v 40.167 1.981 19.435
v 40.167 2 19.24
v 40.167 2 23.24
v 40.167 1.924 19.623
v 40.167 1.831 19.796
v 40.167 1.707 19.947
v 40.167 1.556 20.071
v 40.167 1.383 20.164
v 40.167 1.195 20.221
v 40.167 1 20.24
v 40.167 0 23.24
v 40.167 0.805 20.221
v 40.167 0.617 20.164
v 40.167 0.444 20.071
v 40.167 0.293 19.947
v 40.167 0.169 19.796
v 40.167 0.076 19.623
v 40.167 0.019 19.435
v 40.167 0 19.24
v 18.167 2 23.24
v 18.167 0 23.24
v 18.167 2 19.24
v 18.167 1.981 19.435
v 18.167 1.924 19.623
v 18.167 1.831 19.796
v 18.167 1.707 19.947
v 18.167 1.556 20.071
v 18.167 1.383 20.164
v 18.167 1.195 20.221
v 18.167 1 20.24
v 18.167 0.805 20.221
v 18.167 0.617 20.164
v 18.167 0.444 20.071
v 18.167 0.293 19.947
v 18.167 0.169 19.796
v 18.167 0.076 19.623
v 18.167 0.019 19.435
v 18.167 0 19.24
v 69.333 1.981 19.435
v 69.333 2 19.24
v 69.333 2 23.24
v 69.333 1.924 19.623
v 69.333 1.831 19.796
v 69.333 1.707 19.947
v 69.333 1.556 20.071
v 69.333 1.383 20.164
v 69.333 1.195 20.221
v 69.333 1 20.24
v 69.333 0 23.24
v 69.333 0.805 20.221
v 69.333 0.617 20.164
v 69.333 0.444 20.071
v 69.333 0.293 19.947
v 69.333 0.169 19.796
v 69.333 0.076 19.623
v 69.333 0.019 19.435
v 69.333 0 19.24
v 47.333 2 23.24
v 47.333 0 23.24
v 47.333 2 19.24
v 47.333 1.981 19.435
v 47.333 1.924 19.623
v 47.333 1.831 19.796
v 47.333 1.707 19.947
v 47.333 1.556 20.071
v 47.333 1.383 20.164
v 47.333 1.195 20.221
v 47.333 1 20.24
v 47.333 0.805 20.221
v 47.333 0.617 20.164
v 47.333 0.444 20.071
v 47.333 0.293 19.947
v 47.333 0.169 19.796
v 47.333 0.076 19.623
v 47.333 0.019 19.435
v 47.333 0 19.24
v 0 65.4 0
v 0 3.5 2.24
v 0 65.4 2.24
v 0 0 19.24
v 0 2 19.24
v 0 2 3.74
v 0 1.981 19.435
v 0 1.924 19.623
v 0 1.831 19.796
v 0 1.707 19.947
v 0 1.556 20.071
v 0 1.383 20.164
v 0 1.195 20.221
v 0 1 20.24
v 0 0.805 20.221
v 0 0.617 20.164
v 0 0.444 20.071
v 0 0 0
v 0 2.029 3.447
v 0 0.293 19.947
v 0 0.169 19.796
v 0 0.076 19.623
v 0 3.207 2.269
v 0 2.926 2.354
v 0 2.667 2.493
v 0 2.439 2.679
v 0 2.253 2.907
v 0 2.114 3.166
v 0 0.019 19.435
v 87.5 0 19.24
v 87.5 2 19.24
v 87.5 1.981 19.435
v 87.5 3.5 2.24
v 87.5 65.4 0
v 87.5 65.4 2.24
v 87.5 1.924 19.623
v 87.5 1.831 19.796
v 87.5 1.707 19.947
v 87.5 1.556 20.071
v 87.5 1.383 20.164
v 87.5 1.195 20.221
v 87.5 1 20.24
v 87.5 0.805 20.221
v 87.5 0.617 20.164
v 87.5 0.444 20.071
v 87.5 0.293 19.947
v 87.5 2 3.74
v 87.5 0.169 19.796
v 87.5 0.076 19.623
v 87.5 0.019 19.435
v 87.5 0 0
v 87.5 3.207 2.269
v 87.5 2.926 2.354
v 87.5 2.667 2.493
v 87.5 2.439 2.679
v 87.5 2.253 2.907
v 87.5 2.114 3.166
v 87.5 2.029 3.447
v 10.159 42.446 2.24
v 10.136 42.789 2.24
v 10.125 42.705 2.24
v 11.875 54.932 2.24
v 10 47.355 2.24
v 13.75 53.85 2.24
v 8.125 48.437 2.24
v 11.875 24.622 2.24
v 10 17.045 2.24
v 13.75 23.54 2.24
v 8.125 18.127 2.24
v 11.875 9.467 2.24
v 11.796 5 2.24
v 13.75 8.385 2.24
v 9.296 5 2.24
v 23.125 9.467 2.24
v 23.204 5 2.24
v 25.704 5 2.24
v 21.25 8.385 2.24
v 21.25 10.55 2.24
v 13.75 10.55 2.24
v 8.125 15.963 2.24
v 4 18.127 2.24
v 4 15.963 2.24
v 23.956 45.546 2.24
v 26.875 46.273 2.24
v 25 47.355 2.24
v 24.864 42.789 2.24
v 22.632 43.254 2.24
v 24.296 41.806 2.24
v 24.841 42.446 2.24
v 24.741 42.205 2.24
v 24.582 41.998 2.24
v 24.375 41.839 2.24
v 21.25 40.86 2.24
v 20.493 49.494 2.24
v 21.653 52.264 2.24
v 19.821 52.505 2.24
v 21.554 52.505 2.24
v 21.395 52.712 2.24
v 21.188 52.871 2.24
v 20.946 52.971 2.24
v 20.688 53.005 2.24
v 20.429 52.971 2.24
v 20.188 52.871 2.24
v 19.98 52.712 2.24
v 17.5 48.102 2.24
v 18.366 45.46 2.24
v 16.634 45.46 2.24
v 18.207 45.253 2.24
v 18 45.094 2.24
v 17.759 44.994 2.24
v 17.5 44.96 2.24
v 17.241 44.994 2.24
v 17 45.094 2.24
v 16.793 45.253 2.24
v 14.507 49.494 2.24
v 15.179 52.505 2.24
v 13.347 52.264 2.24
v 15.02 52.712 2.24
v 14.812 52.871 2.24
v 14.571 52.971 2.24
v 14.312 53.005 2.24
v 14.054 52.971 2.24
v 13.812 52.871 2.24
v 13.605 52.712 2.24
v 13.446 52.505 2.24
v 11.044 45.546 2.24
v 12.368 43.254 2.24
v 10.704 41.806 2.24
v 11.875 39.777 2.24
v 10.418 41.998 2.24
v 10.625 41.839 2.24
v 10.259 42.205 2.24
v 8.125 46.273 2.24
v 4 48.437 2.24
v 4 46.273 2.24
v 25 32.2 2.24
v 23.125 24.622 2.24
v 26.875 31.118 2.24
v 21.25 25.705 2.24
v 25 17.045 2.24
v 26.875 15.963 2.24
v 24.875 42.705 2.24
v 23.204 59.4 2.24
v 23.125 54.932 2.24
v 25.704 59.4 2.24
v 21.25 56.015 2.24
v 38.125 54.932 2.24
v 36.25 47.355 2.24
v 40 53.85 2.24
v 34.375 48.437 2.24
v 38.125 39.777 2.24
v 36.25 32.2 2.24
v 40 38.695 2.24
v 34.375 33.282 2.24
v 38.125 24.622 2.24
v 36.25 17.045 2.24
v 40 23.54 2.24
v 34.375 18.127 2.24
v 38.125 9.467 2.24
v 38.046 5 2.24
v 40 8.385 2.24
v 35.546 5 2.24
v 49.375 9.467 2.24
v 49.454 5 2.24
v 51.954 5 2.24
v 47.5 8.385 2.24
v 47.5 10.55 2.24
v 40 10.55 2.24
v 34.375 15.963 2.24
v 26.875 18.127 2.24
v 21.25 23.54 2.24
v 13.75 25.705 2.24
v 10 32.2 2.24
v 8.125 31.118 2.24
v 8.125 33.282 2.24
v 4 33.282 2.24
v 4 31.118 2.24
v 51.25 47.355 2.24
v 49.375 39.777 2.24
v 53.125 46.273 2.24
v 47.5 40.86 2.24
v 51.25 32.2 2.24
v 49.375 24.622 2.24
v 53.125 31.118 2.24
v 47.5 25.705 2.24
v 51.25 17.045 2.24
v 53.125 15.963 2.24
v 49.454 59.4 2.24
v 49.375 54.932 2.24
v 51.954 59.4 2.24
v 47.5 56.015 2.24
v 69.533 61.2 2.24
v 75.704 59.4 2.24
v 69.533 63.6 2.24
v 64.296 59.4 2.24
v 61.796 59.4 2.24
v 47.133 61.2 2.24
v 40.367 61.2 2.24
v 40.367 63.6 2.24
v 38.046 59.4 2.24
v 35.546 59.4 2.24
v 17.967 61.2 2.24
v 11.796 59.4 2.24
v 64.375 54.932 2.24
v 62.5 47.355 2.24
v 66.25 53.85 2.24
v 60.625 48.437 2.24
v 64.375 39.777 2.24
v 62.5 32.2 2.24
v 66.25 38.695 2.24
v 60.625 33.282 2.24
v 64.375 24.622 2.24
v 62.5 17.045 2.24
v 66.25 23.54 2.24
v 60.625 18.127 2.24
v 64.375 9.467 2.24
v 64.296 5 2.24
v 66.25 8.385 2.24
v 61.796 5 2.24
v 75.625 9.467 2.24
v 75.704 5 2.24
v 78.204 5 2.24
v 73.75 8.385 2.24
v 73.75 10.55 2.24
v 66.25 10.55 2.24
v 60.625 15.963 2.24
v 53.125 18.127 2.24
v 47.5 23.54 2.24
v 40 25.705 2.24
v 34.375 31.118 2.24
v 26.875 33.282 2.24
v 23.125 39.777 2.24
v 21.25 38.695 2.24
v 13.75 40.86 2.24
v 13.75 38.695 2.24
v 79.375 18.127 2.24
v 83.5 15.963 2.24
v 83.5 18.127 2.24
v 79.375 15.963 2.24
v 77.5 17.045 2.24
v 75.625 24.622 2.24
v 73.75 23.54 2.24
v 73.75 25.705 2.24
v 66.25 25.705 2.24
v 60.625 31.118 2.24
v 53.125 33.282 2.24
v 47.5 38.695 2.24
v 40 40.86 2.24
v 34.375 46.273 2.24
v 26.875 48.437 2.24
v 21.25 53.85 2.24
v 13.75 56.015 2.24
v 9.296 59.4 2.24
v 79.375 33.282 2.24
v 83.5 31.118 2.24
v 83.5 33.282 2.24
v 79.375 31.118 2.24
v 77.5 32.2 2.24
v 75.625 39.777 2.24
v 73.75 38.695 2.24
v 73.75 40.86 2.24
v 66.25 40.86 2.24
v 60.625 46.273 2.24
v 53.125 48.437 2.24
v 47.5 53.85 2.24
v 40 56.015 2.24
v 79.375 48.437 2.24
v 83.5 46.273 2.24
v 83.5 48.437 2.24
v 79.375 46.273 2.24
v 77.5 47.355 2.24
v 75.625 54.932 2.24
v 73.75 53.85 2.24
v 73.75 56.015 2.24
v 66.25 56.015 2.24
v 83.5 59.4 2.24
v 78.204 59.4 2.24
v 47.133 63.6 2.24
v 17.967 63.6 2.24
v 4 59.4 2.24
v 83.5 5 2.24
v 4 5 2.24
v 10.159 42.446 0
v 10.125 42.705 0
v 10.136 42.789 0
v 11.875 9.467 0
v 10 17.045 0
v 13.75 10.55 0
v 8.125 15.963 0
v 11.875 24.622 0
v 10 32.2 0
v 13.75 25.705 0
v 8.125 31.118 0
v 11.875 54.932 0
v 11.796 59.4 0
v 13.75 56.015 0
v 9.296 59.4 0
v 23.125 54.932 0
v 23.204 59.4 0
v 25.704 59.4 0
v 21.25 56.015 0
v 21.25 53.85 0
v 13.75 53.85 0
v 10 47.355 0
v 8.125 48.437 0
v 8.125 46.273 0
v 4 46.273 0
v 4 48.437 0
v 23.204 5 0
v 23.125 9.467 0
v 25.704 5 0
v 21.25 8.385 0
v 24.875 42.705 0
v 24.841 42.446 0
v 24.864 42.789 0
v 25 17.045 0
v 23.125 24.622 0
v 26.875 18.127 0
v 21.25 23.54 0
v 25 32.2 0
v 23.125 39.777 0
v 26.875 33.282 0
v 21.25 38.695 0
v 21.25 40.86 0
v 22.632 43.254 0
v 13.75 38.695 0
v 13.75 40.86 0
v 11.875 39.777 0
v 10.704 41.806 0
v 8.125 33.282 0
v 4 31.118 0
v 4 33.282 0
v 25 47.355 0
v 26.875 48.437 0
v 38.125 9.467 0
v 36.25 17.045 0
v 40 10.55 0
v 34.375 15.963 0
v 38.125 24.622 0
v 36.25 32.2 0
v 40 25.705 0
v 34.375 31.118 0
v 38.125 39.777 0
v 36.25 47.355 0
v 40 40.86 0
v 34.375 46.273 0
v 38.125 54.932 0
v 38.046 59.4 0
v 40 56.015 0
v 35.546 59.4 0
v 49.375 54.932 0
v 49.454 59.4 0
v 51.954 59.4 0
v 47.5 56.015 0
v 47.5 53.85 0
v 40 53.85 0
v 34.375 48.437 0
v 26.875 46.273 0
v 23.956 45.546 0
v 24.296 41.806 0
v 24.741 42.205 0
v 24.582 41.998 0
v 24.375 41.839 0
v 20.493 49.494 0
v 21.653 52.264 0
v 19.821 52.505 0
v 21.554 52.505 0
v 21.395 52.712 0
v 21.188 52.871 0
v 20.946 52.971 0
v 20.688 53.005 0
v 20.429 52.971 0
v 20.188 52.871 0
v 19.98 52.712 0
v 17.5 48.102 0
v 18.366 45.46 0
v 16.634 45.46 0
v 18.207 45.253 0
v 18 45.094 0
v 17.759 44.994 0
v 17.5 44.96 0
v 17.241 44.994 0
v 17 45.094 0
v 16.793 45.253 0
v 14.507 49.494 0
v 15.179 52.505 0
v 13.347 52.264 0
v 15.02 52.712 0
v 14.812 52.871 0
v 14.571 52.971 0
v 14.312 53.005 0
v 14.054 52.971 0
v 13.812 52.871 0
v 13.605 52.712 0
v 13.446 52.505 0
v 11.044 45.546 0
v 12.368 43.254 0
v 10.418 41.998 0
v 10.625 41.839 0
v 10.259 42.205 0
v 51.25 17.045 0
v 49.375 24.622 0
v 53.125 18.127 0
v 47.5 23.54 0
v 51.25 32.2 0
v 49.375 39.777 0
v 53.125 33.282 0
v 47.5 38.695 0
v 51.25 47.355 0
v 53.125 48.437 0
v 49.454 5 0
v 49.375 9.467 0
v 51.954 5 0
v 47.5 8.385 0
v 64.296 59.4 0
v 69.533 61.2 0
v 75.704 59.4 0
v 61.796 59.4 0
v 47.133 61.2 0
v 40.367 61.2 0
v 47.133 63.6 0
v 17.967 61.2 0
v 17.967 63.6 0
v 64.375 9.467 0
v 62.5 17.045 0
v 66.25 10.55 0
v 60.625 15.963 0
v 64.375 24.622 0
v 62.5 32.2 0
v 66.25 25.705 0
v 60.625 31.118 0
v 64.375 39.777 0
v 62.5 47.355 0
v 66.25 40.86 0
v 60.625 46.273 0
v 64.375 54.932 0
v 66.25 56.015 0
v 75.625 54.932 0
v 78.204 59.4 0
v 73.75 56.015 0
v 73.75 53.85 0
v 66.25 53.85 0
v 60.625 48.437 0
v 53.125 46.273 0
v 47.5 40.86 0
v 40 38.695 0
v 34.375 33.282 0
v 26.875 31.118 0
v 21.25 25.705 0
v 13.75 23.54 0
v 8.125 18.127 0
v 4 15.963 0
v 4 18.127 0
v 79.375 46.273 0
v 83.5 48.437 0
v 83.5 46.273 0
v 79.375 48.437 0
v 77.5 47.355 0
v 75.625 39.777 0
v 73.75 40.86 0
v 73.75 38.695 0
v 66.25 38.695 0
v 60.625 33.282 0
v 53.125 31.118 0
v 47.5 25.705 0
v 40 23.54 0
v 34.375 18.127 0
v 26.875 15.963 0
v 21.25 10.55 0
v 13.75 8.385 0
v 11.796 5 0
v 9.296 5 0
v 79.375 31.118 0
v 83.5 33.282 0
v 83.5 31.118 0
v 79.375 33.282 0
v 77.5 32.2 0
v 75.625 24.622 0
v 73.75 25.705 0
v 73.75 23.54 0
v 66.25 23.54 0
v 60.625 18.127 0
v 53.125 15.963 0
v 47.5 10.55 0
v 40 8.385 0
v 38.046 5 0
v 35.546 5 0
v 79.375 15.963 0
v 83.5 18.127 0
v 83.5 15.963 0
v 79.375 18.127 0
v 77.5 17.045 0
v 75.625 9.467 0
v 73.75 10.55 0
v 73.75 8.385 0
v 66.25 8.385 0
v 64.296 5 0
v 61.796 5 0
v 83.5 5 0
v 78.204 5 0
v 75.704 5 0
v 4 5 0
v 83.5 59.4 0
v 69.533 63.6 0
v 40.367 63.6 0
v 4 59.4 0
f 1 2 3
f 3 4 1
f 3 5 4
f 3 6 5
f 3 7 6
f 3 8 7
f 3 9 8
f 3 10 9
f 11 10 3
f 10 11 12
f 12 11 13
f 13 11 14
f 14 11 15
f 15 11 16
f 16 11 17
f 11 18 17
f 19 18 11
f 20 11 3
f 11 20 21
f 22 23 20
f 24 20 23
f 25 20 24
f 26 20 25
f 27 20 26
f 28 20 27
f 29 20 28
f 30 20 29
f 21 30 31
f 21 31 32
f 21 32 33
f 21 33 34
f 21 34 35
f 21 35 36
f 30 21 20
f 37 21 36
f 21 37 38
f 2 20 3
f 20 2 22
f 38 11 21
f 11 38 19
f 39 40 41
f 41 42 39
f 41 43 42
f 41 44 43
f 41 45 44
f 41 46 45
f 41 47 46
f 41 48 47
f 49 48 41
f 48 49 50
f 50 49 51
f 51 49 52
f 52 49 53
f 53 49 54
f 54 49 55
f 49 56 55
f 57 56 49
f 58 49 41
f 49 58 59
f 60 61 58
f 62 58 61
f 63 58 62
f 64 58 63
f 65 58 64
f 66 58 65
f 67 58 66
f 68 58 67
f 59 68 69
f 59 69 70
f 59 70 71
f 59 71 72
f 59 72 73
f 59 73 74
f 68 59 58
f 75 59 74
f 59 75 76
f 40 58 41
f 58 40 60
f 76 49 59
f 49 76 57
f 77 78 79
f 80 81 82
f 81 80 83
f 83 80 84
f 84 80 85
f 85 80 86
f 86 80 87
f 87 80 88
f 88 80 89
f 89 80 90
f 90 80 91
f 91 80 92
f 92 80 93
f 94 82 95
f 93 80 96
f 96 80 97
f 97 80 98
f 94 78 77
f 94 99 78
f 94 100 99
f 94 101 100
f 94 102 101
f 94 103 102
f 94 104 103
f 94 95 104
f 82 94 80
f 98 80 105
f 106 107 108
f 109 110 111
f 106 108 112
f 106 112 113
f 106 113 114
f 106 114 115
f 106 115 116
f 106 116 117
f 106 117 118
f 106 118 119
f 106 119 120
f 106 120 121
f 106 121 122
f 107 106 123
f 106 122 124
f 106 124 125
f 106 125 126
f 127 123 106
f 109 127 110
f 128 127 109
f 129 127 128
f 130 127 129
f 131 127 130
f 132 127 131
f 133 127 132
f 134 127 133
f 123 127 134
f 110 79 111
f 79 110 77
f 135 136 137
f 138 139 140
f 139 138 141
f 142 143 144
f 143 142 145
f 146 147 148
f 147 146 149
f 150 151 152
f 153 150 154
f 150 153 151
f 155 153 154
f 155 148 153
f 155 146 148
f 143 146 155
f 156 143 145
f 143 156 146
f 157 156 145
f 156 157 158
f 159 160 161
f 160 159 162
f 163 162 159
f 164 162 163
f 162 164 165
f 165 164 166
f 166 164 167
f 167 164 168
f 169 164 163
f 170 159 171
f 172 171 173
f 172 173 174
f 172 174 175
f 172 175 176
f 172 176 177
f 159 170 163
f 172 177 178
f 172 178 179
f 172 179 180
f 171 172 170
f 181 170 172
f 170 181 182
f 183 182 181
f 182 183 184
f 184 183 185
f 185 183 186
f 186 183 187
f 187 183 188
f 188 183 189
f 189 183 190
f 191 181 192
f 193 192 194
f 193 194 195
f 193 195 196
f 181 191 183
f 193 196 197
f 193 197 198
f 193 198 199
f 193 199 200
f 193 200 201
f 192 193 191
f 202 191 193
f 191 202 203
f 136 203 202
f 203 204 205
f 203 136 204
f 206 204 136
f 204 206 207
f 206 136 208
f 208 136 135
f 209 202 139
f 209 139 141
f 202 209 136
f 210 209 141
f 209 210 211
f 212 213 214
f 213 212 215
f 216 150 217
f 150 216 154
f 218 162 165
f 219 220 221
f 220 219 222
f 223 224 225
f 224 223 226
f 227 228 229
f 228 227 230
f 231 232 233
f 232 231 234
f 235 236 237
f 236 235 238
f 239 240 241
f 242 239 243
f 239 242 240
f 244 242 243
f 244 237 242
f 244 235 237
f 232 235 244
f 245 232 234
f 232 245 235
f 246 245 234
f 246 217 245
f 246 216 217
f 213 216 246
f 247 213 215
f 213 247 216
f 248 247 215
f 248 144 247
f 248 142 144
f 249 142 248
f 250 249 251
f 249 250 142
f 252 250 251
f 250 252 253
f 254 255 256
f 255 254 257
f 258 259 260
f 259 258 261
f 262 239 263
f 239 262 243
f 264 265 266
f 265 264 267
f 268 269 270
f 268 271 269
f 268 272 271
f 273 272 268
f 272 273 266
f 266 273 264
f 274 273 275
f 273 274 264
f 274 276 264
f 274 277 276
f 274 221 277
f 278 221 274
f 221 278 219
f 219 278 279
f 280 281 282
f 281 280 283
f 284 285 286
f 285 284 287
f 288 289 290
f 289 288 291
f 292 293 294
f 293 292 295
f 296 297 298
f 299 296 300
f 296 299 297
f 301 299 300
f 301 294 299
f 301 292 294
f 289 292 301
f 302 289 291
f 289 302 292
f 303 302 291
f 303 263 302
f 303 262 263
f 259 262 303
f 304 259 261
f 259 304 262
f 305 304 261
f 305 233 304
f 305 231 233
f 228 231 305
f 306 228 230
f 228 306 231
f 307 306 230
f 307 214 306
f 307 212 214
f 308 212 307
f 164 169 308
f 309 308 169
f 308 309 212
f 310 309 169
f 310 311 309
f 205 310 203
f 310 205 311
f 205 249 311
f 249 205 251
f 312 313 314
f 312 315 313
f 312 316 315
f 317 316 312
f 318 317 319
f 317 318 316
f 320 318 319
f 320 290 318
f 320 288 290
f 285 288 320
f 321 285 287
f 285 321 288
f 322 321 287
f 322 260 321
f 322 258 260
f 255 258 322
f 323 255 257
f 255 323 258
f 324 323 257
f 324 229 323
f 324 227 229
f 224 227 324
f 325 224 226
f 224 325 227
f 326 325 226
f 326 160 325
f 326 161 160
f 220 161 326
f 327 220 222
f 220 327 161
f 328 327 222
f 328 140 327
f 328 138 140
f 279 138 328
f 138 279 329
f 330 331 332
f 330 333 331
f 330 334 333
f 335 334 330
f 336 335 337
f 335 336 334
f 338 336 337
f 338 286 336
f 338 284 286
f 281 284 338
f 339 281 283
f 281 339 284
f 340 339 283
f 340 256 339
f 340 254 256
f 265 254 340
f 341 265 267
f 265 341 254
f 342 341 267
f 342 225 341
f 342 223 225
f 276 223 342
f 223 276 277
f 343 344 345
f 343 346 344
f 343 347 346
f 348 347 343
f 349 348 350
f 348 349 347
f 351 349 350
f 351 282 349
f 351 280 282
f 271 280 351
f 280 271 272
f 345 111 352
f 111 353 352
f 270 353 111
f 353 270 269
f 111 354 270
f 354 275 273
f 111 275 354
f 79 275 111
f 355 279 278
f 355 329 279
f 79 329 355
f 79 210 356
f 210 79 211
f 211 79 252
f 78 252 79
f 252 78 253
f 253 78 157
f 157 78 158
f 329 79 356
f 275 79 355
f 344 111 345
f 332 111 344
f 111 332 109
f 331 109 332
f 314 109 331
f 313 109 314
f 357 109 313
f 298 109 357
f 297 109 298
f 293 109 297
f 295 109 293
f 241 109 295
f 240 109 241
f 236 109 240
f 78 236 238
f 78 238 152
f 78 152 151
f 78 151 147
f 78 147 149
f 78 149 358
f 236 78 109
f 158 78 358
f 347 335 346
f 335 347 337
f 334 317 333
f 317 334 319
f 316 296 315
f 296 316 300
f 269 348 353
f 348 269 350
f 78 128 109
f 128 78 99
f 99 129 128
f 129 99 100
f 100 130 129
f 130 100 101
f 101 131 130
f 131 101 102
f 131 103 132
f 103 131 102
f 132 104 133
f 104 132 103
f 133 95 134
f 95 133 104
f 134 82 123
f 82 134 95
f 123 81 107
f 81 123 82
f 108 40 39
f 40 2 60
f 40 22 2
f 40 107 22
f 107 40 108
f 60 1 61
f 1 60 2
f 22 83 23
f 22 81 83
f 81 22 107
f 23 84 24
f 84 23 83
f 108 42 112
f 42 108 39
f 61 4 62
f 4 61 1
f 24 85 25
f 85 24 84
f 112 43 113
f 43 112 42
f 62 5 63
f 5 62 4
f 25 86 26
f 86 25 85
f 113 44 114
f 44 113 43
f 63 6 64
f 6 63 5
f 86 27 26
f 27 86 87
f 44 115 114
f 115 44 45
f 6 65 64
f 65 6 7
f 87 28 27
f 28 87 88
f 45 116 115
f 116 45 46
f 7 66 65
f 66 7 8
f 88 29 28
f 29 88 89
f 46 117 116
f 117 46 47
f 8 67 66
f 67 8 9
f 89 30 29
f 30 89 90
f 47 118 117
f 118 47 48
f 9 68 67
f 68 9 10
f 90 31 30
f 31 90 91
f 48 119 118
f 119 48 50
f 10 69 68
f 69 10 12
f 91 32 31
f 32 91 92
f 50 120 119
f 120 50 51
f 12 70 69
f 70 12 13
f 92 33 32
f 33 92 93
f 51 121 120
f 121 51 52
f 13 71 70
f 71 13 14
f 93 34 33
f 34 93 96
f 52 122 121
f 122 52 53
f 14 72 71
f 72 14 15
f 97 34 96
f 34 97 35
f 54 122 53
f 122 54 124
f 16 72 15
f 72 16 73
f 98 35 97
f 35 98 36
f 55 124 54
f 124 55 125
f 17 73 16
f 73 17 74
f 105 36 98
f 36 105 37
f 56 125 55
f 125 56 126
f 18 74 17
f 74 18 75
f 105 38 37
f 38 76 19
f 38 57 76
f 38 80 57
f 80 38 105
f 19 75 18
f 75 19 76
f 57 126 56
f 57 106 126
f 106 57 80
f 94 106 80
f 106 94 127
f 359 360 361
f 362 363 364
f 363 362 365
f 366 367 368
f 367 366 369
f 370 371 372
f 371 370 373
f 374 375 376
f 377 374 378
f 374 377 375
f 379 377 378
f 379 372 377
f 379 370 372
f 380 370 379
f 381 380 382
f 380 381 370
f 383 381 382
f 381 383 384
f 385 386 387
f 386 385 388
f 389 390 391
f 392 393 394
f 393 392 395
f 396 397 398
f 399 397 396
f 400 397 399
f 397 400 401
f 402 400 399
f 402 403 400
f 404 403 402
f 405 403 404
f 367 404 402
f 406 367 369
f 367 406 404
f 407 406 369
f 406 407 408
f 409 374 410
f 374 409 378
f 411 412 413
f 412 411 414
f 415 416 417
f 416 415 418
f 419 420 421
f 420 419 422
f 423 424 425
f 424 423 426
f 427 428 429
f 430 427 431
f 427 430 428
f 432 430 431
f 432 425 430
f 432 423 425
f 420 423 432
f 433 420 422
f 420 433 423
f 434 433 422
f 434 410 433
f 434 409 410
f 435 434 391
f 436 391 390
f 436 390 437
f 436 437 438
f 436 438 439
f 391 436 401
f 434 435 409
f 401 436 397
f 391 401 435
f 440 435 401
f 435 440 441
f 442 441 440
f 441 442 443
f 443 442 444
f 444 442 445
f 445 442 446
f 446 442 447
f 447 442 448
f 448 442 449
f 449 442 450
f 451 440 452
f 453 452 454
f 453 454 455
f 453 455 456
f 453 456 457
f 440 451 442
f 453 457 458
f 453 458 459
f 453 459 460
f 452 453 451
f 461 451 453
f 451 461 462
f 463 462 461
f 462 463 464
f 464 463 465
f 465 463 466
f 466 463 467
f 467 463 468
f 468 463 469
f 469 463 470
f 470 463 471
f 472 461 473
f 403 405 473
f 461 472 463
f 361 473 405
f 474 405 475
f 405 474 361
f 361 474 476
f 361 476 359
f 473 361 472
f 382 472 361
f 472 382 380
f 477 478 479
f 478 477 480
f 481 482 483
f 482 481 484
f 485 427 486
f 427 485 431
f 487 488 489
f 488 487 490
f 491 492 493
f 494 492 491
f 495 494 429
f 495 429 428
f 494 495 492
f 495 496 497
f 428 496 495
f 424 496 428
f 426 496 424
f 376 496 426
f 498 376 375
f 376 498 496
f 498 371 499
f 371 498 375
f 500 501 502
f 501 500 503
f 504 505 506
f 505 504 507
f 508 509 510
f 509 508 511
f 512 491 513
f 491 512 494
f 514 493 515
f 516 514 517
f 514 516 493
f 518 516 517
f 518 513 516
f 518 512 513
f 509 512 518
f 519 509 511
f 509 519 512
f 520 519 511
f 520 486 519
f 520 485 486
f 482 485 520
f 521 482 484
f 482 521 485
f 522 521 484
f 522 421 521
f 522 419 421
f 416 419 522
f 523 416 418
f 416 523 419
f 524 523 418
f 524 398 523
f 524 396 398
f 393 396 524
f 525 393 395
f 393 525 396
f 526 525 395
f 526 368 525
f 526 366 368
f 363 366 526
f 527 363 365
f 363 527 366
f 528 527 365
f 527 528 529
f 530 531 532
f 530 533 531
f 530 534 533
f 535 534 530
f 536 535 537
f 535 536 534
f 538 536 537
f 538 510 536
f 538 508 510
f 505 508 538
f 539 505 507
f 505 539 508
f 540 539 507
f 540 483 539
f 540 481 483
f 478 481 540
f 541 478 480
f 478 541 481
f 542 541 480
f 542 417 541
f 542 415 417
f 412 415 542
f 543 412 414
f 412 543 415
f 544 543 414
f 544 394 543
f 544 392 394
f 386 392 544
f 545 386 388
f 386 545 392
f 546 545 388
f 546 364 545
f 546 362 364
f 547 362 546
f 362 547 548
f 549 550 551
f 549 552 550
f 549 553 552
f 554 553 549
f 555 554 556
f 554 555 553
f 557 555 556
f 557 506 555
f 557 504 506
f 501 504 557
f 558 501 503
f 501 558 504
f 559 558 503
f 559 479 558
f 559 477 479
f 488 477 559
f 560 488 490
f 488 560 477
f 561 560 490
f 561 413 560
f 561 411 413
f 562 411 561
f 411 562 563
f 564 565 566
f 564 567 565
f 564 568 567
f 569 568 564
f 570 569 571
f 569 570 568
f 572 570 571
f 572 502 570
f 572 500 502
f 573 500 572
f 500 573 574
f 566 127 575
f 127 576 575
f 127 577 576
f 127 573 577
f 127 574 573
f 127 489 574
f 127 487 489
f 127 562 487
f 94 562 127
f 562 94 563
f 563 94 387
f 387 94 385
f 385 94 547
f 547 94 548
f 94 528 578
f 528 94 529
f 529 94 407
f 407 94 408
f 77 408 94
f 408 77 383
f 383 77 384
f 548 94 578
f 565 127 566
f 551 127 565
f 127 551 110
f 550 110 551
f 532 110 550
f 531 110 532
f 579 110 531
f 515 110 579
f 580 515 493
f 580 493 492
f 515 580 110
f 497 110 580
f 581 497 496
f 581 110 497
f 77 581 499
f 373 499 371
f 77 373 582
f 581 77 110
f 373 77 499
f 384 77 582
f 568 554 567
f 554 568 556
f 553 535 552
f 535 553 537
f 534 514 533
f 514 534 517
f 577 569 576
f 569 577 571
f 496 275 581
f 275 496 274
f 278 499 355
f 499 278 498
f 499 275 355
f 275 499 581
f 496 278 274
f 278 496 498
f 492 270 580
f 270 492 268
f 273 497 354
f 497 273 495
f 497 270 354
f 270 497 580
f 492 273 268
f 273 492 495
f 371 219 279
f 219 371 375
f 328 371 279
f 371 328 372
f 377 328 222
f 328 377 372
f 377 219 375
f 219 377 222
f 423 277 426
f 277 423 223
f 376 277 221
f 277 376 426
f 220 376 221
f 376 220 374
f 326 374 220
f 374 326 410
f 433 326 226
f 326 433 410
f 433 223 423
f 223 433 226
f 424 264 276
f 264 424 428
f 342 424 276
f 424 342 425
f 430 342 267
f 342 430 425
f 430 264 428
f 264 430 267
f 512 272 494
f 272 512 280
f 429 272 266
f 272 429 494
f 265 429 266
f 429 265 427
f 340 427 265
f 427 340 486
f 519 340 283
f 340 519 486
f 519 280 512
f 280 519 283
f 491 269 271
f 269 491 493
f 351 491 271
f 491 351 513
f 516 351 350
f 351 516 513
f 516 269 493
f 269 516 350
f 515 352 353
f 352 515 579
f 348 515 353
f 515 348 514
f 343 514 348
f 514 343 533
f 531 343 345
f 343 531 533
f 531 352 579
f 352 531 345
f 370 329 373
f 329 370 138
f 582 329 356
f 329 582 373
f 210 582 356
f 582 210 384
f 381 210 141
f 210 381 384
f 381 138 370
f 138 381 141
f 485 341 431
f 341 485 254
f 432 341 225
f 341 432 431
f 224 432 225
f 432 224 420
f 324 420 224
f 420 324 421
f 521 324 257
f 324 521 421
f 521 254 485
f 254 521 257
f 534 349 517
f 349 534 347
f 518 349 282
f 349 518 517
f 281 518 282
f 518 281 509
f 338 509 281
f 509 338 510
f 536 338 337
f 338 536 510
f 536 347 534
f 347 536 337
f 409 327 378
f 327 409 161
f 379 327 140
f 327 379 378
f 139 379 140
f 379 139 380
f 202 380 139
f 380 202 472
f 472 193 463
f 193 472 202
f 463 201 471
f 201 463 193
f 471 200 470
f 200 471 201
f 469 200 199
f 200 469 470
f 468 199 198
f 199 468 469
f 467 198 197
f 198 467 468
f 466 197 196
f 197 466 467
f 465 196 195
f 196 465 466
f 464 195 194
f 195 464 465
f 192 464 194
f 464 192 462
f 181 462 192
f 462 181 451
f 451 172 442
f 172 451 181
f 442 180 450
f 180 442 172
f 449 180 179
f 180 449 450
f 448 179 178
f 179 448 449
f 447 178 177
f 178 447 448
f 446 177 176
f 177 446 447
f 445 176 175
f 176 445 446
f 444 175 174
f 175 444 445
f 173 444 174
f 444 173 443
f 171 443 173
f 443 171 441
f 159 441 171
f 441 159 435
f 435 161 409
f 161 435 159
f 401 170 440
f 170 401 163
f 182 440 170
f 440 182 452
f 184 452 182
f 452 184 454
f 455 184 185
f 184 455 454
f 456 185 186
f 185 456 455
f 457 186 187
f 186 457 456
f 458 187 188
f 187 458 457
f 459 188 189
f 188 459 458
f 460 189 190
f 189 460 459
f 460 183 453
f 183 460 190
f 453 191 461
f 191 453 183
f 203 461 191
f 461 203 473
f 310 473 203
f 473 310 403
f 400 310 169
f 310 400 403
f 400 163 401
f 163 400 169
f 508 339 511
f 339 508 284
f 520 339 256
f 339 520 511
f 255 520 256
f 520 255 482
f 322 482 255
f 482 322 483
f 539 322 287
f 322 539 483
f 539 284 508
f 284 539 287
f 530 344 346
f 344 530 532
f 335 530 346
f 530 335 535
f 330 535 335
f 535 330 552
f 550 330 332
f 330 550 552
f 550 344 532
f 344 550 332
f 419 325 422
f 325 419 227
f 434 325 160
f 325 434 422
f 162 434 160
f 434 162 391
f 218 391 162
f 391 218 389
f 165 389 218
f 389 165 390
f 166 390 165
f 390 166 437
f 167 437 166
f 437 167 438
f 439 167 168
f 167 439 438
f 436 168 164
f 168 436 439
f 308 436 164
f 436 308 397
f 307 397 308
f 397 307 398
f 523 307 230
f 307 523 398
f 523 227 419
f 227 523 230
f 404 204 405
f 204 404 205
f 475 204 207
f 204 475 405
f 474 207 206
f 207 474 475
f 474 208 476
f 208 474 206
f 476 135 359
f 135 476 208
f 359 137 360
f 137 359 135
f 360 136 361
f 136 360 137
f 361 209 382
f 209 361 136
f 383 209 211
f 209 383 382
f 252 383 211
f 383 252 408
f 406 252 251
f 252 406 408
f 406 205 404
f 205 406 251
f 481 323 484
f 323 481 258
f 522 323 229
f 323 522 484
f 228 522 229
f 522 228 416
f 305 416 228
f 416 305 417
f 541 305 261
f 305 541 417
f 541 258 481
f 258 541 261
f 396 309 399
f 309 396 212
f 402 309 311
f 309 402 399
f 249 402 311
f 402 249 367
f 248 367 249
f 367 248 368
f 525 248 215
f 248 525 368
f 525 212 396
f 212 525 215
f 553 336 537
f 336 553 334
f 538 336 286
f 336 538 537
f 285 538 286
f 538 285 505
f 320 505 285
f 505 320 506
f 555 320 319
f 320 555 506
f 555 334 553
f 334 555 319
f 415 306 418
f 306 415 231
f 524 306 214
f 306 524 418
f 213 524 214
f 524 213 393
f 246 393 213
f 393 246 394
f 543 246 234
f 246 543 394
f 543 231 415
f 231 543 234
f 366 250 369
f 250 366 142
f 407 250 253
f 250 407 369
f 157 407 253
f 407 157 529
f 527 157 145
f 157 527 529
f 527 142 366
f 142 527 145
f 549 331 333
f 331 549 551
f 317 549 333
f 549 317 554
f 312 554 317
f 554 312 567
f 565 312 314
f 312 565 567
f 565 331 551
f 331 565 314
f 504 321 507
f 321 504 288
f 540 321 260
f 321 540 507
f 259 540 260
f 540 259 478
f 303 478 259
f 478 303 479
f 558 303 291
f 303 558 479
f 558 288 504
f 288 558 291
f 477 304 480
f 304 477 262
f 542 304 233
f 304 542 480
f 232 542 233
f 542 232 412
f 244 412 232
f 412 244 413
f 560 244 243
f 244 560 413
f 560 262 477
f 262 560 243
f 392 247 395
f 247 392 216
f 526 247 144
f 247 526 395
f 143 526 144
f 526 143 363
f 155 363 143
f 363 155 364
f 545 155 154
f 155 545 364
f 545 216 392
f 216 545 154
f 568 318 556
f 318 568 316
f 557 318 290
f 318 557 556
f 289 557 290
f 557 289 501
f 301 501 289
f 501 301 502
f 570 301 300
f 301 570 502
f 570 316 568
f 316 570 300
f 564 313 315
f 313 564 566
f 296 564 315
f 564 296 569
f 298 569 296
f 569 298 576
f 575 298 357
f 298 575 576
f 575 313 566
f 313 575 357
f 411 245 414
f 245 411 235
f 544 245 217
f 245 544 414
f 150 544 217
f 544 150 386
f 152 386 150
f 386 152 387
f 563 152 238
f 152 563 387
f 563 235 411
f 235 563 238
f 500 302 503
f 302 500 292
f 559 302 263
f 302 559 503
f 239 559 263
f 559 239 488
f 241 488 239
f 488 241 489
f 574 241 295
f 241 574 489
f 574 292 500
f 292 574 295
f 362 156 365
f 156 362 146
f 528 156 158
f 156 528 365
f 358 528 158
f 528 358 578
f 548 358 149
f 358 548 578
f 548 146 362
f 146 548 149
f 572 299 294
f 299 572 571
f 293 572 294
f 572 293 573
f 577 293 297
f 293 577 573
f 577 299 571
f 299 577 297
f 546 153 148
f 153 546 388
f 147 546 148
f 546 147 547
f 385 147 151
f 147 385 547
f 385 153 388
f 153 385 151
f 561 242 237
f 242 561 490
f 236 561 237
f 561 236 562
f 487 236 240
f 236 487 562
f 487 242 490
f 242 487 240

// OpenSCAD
// Wake flat v2: built on the v6 design. One-piece L riser printed flat, plate on the bed, lip standing up.
// Kept exactly from v6: plate size (65.4 mm deep x width), 2.24 mm plate (2 + 0.24 extra back layers),
//   hex size/gap/borders/grid positions, the small W, and the lip size (2 mm thick, 20 mm deep from the front face).
// New: wall tabs on the lip top that rest by gravity in slots near the free edge of the next plate.
// No ridges, channels or bands.
//
// Axes: x = width, y = plate depth (y=0 is the lip end of the plate, v6's z_bot end), z = up (plate front face up).
// The x axis is mirrored relative to v6's panel coordinates so the part is the same physical part, not a mirror image.

half_length = true;                       // prototype: half of 175 mm
width       = half_length ? 87.5 : 175;

// v6 plate: back_height 70.5 - panel_top_trim 1.0 - boss_h 4.1
panel_h  = 65.4;
wall     = 2;                             // lip thickness (v6 `wall`)
back_extra = 0.24;                        // v6: 2 * 0.12 extra layers on the back
plate_t  = wall + back_extra;
bottom_lip_depth = 20;                    // v6 lip depth, measured from the back face's y datum
lip_h    = bottom_lip_depth + back_extra; // lip height from the bed: sticks out 18 mm past the front face, same as v6
fillet_in = 1.5;                          // where the lip meets the plate

// hex grid, same as v6
hex_size   = 15;
hex_gap    = 2.5;
border_x   = 4;
border_top = 6;
band_h     = 5;                           // v6 band_v 2 + ramp_h 3: hex area starts this far from the lip end

// small W, same as v6: one hex at the far corner, max x and max v6-z
small_w_on     = true;
small_w_w      = 0.85;
small_w_h      = 0.62;
small_w_stroke = 2.0;
letter_flip    = true;

// tabs on the lip top, slots in the plate
tab_count   = half_length ? 2 : 3;
tab_len     = 22;
tab_h       = 3;                          // tabs stick up past lip_h
tab_clear   = 0.2;                        // slot clearance per side
slot_from_edge = 3;                       // free edge to slot centre line (hex area ends border_top = 6 from the edge)
tab_xs = [for (i = [0 : tab_count - 1]) width * (i + 1) / (tab_count + 1)];

$fn = 32;

function cells(w, h) =
    let (pitch = hex_size + hex_gap, step_x = pitch * 0.75, step_z = pitch * 0.866,
         cx = w / 2, cz = h / 2,
         ncols = ceil(w / (2 * step_x)) + 2, nrows = ceil(h / (2 * step_z)) + 2)
    [for (col = [-ncols : ncols]) for (row = [-nrows : nrows])
        let (parity = ((col % 2) + 2) % 2,
             x = cx + col * step_x,
             z = cz + row * step_z + (parity == 0 ? 0 : step_z / 2))
        [x, z]];

function corner_cell(w, h) =
    let (c = [for (p = cells(w, h)) if (p[0] - hex_size / 2 >= 0 && p[0] + hex_size / 2 <= w && p[1] - hex_size / 2 >= 0 && p[1] + hex_size / 2 <= h) p],
         best = max([for (p = c) p[0] + p[1]]))
    [for (p = c) if (p[0] + p[1] == best) p][0];

module w_shape2d(lw, lh, stroke) {
    f = letter_flip ? -1 : 1;
    pts = [[-lw / 2, f * lh / 2], [-lw / 4, -f * lh / 2], [0, f * lh * 0.15], [lw / 4, -f * lh / 2], [lw / 2, f * lh / 2]];
    for (i = [0 : 3]) hull() {
        translate(pts[i]) circle(d = stroke, $fn = 24);
        translate(pts[i + 1]) circle(d = stroke, $fn = 24);
    }
}

// the v6 hex pattern as a 2D cut; the cell grid is symmetric in x, only the W cell is mirrored
module hex_cut2d(w, h) {
    cc = corner_cell(w, h);
    difference() {
        intersection() {
            for (c = cells(w, h)) translate(c) circle(d = hex_size, $fn = 6);
            square([w, h]);
        }
        if (small_w_on)
            translate([w - cc[0], cc[1]]) w_shape2d(hex_size * small_w_w, hex_size * small_w_h, small_w_stroke);
    }
}

// (y, z) profile of plate + lip + fillet, extruded along x
module body() {
    r = wall / 2;
    rotate([90, 0, 90]) linear_extrude(width) union() {
        square([panel_h, plate_t]);
        square([wall, lip_h - r]);
        translate([r, lip_h - r]) circle(r = r, $fn = 32);       // rounded lip top, as in v6
        difference() {
            translate([wall - 0.01, plate_t - 0.01]) square([fillet_in + 0.01, fillet_in + 0.01]);
            translate([wall + fillet_in, plate_t + fillet_in]) circle(r = fillet_in);
        }
    }
}

module tabs() {
    for (x = tab_xs)
        translate([x - tab_len / 2, 0, lip_h - wall / 2]) cube([tab_len, wall, tab_h + wall / 2]);
}

module slots() {
    sw = wall + 2 * tab_clear;
    sl = tab_len + 2 * tab_clear;
    for (x = tab_xs)
        translate([x - sl / 2, panel_h - slot_from_edge - sw / 2, -1]) cube([sl, sw, plate_t + 2]);
}

module riser() {
    difference() {
        union() { body(); tabs(); }
        translate([border_x, band_h, -1]) linear_extrude(plate_t + 2)
            hex_cut2d(width - 2 * border_x, panel_h - band_h - border_top);
        slots();
    }
}

riser();
